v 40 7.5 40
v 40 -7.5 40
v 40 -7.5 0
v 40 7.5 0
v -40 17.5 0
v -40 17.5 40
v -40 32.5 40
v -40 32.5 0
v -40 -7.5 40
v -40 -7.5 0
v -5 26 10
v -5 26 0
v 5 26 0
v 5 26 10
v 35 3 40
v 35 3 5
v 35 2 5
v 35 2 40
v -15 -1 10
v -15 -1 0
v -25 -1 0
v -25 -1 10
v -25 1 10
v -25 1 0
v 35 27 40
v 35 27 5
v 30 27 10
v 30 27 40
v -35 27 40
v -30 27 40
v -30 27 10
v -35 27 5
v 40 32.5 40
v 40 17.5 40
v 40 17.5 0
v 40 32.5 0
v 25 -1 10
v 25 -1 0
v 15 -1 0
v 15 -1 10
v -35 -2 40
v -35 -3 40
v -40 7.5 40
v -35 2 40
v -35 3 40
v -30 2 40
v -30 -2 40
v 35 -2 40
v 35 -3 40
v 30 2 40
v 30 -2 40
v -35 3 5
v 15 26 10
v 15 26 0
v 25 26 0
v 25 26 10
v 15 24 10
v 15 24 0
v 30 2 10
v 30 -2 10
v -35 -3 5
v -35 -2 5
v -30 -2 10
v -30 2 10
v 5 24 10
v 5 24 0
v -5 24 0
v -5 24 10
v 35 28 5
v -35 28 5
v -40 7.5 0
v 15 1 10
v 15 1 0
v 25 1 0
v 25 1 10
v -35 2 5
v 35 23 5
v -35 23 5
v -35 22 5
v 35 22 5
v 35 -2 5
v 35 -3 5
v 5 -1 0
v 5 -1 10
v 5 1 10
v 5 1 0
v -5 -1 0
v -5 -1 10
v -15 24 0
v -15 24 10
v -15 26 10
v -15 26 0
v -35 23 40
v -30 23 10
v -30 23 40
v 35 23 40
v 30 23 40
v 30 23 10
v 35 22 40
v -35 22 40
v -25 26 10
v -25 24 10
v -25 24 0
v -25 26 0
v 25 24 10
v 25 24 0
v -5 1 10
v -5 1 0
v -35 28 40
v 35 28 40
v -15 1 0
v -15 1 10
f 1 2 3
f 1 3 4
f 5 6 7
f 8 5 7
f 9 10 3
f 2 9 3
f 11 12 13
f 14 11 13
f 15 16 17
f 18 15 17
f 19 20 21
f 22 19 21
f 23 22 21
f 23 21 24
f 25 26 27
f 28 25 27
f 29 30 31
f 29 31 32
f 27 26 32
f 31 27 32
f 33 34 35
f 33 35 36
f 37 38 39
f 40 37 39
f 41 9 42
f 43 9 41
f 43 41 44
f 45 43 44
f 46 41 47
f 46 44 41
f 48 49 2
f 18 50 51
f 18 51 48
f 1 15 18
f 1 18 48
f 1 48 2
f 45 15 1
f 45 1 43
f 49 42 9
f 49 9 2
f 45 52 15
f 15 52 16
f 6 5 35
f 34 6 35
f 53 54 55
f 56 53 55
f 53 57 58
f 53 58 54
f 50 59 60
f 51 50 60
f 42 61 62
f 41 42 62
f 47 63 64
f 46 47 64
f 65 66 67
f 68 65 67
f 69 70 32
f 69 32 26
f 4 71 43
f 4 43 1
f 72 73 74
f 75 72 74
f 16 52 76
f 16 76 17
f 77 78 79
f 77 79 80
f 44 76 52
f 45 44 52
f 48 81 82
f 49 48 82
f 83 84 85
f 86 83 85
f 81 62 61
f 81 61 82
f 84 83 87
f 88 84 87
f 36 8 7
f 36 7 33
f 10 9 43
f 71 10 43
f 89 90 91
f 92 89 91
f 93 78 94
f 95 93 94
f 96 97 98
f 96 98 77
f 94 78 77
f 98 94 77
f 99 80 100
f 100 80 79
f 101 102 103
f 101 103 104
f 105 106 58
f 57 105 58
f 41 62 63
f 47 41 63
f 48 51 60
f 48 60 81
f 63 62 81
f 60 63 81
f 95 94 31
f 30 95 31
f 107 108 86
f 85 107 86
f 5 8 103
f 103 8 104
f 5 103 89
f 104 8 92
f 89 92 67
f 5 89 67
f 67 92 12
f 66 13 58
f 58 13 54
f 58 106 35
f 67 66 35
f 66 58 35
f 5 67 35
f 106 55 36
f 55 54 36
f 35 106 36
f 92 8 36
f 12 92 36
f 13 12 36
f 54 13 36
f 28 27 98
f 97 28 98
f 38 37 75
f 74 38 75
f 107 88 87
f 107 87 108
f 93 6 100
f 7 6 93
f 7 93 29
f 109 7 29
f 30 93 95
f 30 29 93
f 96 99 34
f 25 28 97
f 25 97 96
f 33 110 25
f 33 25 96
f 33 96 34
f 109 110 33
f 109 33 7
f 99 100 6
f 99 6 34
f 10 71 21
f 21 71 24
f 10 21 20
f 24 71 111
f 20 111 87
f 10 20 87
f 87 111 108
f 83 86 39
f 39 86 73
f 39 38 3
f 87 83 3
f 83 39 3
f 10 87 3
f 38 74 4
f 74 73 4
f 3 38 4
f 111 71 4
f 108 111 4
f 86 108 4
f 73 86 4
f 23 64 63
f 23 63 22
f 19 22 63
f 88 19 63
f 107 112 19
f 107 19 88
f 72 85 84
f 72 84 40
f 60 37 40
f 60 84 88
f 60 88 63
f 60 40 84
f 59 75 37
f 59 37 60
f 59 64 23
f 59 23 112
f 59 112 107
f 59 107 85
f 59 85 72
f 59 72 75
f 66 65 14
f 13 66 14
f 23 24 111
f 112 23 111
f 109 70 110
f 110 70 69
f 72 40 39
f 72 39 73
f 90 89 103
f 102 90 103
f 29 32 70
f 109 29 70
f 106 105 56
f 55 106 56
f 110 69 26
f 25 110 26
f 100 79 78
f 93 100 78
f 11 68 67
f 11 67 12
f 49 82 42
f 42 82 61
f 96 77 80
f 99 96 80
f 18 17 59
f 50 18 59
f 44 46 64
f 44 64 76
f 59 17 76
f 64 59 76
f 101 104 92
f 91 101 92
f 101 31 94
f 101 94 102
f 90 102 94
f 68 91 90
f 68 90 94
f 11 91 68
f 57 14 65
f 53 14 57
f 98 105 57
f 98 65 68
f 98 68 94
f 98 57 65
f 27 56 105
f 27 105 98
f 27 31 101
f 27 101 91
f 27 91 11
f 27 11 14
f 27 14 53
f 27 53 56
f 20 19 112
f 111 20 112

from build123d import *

# Parameters (mm, degrees)
F0_W     = 80
F0_H     = 15
F1_DEPTH = 40
F2_DEPTH = 5
F3_DEPTH = 10
F0_W_2   = 5
F0_H_2   = 2
F0_W_3   = 10
F4_DEPTH = 10


with BuildPart() as f1:
    # F0 (on Top) → F1 (new body)
    with BuildSketch(Plane.XY):
        Rectangle(F0_W, F0_H)
        Polygon((-35, 3), (35, 3), (35, 2), (30, 2), (30, 1), (30, -1), (30, -2), (35, -2), (35, -3), (-35, -3), (-35, -2), (-30, -2), (-30, -1), (-30, 1), (-30, 2), (-35, 2), align=None, mode=Mode.SUBTRACT)
    extrude(amount=F1_DEPTH)

    # F0 (on Top) → F2, piece 2 (join)
    with BuildSketch(Plane.XY):
        Polygon((35, 2), (35, 3), (-35, 3), (-35, 2), (-30, 2), (30, 2), align=None)
        Polygon((35, -2), (30, -2), (-30, -2), (-35, -2), (-35, -3), (35, -3), align=None)
    extrude(amount=F2_DEPTH)

    # F0 (on Top) → F3 (join)
    with BuildSketch(Plane.XY):
        Polygon((30, 1), (30, 2), (-30, 2), (-30, 1), (-25, 1), (-15, 1), (-5, 1), (5, 1), (15, 1), (25, 1), align=None)
        Polygon((30, -2), (30, -1), (25, -1), (15, -1), (5, -1), (-5, -1), (-15, -1), (-25, -1), (-30, -1), (-30, -2), align=None)
    extrude(amount=F3_DEPTH)

    # F0 (on Top) → F4, piece 2 (join)
    with BuildSketch(Plane.XY):
        with Locations((27.5, 0)):
            Rectangle(F0_W_2, F0_H_2)
        with Locations((10, 0)):
            Rectangle(F0_W_3, F0_H_2)
        with Locations((-10, 0)):
            Rectangle(F0_W_3, F0_H_2)
        with Locations((-27.5, 0)):
            Rectangle(F0_W_2, F0_H_2)
    extrude(amount=F4_DEPTH)


with BuildPart() as f1b:
    # F0 (on Top) → F1, piece 2 (new body)
    with BuildSketch(Plane.XY):
        with Locations((0, 25)):
            Rectangle(F0_W, F0_H)
        Polygon((-35, 28), (35, 28), (35, 27), (30, 27), (30, 26), (30, 24), (30, 23), (35, 23), (35, 22), (-35, 22), (-35, 23), (-30, 23), (-30, 24), (-30, 26), (-30, 27), (-35, 27), align=None, mode=Mode.SUBTRACT)
    extrude(amount=F1_DEPTH)

    # F0 (on Top) → F2 (join)
    with BuildSketch(Plane.XY):
        Polygon((35, 23), (30, 23), (-30, 23), (-35, 23), (-35, 22), (35, 22), align=None)
        Polygon((35, 27), (35, 28), (-35, 28), (-35, 27), (-30, 27), (30, 27), align=None)
    extrude(amount=F2_DEPTH)

    # F0 (on Top) → F3, piece 2 (join)
    with BuildSketch(Plane.XY):
        Polygon((30, 23), (30, 24), (25, 24), (15, 24), (5, 24), (-5, 24), (-15, 24), (-25, 24), (-30, 24), (-30, 23), align=None)
        Polygon((30, 26), (30, 27), (-30, 27), (-30, 26), (-25, 26), (-15, 26), (-5, 26), (5, 26), (15, 26), (25, 26), align=None)
    extrude(amount=F3_DEPTH)

    # F0 (on Top) → F4 (join)
    with BuildSketch(Plane.XY):
        with Locations((27.5, 25)):
            Rectangle(F0_W_2, F0_H_2)
        with Locations((10, 25)):
            Rectangle(F0_W_3, F0_H_2)
        with Locations((-10, 25)):
            Rectangle(F0_W_3, F0_H_2)
        with Locations((-27.5, 25)):
            Rectangle(F0_W_2, F0_H_2)
    extrude(amount=F4_DEPTH)


solid = Compound([f1.part, f1b.part])
